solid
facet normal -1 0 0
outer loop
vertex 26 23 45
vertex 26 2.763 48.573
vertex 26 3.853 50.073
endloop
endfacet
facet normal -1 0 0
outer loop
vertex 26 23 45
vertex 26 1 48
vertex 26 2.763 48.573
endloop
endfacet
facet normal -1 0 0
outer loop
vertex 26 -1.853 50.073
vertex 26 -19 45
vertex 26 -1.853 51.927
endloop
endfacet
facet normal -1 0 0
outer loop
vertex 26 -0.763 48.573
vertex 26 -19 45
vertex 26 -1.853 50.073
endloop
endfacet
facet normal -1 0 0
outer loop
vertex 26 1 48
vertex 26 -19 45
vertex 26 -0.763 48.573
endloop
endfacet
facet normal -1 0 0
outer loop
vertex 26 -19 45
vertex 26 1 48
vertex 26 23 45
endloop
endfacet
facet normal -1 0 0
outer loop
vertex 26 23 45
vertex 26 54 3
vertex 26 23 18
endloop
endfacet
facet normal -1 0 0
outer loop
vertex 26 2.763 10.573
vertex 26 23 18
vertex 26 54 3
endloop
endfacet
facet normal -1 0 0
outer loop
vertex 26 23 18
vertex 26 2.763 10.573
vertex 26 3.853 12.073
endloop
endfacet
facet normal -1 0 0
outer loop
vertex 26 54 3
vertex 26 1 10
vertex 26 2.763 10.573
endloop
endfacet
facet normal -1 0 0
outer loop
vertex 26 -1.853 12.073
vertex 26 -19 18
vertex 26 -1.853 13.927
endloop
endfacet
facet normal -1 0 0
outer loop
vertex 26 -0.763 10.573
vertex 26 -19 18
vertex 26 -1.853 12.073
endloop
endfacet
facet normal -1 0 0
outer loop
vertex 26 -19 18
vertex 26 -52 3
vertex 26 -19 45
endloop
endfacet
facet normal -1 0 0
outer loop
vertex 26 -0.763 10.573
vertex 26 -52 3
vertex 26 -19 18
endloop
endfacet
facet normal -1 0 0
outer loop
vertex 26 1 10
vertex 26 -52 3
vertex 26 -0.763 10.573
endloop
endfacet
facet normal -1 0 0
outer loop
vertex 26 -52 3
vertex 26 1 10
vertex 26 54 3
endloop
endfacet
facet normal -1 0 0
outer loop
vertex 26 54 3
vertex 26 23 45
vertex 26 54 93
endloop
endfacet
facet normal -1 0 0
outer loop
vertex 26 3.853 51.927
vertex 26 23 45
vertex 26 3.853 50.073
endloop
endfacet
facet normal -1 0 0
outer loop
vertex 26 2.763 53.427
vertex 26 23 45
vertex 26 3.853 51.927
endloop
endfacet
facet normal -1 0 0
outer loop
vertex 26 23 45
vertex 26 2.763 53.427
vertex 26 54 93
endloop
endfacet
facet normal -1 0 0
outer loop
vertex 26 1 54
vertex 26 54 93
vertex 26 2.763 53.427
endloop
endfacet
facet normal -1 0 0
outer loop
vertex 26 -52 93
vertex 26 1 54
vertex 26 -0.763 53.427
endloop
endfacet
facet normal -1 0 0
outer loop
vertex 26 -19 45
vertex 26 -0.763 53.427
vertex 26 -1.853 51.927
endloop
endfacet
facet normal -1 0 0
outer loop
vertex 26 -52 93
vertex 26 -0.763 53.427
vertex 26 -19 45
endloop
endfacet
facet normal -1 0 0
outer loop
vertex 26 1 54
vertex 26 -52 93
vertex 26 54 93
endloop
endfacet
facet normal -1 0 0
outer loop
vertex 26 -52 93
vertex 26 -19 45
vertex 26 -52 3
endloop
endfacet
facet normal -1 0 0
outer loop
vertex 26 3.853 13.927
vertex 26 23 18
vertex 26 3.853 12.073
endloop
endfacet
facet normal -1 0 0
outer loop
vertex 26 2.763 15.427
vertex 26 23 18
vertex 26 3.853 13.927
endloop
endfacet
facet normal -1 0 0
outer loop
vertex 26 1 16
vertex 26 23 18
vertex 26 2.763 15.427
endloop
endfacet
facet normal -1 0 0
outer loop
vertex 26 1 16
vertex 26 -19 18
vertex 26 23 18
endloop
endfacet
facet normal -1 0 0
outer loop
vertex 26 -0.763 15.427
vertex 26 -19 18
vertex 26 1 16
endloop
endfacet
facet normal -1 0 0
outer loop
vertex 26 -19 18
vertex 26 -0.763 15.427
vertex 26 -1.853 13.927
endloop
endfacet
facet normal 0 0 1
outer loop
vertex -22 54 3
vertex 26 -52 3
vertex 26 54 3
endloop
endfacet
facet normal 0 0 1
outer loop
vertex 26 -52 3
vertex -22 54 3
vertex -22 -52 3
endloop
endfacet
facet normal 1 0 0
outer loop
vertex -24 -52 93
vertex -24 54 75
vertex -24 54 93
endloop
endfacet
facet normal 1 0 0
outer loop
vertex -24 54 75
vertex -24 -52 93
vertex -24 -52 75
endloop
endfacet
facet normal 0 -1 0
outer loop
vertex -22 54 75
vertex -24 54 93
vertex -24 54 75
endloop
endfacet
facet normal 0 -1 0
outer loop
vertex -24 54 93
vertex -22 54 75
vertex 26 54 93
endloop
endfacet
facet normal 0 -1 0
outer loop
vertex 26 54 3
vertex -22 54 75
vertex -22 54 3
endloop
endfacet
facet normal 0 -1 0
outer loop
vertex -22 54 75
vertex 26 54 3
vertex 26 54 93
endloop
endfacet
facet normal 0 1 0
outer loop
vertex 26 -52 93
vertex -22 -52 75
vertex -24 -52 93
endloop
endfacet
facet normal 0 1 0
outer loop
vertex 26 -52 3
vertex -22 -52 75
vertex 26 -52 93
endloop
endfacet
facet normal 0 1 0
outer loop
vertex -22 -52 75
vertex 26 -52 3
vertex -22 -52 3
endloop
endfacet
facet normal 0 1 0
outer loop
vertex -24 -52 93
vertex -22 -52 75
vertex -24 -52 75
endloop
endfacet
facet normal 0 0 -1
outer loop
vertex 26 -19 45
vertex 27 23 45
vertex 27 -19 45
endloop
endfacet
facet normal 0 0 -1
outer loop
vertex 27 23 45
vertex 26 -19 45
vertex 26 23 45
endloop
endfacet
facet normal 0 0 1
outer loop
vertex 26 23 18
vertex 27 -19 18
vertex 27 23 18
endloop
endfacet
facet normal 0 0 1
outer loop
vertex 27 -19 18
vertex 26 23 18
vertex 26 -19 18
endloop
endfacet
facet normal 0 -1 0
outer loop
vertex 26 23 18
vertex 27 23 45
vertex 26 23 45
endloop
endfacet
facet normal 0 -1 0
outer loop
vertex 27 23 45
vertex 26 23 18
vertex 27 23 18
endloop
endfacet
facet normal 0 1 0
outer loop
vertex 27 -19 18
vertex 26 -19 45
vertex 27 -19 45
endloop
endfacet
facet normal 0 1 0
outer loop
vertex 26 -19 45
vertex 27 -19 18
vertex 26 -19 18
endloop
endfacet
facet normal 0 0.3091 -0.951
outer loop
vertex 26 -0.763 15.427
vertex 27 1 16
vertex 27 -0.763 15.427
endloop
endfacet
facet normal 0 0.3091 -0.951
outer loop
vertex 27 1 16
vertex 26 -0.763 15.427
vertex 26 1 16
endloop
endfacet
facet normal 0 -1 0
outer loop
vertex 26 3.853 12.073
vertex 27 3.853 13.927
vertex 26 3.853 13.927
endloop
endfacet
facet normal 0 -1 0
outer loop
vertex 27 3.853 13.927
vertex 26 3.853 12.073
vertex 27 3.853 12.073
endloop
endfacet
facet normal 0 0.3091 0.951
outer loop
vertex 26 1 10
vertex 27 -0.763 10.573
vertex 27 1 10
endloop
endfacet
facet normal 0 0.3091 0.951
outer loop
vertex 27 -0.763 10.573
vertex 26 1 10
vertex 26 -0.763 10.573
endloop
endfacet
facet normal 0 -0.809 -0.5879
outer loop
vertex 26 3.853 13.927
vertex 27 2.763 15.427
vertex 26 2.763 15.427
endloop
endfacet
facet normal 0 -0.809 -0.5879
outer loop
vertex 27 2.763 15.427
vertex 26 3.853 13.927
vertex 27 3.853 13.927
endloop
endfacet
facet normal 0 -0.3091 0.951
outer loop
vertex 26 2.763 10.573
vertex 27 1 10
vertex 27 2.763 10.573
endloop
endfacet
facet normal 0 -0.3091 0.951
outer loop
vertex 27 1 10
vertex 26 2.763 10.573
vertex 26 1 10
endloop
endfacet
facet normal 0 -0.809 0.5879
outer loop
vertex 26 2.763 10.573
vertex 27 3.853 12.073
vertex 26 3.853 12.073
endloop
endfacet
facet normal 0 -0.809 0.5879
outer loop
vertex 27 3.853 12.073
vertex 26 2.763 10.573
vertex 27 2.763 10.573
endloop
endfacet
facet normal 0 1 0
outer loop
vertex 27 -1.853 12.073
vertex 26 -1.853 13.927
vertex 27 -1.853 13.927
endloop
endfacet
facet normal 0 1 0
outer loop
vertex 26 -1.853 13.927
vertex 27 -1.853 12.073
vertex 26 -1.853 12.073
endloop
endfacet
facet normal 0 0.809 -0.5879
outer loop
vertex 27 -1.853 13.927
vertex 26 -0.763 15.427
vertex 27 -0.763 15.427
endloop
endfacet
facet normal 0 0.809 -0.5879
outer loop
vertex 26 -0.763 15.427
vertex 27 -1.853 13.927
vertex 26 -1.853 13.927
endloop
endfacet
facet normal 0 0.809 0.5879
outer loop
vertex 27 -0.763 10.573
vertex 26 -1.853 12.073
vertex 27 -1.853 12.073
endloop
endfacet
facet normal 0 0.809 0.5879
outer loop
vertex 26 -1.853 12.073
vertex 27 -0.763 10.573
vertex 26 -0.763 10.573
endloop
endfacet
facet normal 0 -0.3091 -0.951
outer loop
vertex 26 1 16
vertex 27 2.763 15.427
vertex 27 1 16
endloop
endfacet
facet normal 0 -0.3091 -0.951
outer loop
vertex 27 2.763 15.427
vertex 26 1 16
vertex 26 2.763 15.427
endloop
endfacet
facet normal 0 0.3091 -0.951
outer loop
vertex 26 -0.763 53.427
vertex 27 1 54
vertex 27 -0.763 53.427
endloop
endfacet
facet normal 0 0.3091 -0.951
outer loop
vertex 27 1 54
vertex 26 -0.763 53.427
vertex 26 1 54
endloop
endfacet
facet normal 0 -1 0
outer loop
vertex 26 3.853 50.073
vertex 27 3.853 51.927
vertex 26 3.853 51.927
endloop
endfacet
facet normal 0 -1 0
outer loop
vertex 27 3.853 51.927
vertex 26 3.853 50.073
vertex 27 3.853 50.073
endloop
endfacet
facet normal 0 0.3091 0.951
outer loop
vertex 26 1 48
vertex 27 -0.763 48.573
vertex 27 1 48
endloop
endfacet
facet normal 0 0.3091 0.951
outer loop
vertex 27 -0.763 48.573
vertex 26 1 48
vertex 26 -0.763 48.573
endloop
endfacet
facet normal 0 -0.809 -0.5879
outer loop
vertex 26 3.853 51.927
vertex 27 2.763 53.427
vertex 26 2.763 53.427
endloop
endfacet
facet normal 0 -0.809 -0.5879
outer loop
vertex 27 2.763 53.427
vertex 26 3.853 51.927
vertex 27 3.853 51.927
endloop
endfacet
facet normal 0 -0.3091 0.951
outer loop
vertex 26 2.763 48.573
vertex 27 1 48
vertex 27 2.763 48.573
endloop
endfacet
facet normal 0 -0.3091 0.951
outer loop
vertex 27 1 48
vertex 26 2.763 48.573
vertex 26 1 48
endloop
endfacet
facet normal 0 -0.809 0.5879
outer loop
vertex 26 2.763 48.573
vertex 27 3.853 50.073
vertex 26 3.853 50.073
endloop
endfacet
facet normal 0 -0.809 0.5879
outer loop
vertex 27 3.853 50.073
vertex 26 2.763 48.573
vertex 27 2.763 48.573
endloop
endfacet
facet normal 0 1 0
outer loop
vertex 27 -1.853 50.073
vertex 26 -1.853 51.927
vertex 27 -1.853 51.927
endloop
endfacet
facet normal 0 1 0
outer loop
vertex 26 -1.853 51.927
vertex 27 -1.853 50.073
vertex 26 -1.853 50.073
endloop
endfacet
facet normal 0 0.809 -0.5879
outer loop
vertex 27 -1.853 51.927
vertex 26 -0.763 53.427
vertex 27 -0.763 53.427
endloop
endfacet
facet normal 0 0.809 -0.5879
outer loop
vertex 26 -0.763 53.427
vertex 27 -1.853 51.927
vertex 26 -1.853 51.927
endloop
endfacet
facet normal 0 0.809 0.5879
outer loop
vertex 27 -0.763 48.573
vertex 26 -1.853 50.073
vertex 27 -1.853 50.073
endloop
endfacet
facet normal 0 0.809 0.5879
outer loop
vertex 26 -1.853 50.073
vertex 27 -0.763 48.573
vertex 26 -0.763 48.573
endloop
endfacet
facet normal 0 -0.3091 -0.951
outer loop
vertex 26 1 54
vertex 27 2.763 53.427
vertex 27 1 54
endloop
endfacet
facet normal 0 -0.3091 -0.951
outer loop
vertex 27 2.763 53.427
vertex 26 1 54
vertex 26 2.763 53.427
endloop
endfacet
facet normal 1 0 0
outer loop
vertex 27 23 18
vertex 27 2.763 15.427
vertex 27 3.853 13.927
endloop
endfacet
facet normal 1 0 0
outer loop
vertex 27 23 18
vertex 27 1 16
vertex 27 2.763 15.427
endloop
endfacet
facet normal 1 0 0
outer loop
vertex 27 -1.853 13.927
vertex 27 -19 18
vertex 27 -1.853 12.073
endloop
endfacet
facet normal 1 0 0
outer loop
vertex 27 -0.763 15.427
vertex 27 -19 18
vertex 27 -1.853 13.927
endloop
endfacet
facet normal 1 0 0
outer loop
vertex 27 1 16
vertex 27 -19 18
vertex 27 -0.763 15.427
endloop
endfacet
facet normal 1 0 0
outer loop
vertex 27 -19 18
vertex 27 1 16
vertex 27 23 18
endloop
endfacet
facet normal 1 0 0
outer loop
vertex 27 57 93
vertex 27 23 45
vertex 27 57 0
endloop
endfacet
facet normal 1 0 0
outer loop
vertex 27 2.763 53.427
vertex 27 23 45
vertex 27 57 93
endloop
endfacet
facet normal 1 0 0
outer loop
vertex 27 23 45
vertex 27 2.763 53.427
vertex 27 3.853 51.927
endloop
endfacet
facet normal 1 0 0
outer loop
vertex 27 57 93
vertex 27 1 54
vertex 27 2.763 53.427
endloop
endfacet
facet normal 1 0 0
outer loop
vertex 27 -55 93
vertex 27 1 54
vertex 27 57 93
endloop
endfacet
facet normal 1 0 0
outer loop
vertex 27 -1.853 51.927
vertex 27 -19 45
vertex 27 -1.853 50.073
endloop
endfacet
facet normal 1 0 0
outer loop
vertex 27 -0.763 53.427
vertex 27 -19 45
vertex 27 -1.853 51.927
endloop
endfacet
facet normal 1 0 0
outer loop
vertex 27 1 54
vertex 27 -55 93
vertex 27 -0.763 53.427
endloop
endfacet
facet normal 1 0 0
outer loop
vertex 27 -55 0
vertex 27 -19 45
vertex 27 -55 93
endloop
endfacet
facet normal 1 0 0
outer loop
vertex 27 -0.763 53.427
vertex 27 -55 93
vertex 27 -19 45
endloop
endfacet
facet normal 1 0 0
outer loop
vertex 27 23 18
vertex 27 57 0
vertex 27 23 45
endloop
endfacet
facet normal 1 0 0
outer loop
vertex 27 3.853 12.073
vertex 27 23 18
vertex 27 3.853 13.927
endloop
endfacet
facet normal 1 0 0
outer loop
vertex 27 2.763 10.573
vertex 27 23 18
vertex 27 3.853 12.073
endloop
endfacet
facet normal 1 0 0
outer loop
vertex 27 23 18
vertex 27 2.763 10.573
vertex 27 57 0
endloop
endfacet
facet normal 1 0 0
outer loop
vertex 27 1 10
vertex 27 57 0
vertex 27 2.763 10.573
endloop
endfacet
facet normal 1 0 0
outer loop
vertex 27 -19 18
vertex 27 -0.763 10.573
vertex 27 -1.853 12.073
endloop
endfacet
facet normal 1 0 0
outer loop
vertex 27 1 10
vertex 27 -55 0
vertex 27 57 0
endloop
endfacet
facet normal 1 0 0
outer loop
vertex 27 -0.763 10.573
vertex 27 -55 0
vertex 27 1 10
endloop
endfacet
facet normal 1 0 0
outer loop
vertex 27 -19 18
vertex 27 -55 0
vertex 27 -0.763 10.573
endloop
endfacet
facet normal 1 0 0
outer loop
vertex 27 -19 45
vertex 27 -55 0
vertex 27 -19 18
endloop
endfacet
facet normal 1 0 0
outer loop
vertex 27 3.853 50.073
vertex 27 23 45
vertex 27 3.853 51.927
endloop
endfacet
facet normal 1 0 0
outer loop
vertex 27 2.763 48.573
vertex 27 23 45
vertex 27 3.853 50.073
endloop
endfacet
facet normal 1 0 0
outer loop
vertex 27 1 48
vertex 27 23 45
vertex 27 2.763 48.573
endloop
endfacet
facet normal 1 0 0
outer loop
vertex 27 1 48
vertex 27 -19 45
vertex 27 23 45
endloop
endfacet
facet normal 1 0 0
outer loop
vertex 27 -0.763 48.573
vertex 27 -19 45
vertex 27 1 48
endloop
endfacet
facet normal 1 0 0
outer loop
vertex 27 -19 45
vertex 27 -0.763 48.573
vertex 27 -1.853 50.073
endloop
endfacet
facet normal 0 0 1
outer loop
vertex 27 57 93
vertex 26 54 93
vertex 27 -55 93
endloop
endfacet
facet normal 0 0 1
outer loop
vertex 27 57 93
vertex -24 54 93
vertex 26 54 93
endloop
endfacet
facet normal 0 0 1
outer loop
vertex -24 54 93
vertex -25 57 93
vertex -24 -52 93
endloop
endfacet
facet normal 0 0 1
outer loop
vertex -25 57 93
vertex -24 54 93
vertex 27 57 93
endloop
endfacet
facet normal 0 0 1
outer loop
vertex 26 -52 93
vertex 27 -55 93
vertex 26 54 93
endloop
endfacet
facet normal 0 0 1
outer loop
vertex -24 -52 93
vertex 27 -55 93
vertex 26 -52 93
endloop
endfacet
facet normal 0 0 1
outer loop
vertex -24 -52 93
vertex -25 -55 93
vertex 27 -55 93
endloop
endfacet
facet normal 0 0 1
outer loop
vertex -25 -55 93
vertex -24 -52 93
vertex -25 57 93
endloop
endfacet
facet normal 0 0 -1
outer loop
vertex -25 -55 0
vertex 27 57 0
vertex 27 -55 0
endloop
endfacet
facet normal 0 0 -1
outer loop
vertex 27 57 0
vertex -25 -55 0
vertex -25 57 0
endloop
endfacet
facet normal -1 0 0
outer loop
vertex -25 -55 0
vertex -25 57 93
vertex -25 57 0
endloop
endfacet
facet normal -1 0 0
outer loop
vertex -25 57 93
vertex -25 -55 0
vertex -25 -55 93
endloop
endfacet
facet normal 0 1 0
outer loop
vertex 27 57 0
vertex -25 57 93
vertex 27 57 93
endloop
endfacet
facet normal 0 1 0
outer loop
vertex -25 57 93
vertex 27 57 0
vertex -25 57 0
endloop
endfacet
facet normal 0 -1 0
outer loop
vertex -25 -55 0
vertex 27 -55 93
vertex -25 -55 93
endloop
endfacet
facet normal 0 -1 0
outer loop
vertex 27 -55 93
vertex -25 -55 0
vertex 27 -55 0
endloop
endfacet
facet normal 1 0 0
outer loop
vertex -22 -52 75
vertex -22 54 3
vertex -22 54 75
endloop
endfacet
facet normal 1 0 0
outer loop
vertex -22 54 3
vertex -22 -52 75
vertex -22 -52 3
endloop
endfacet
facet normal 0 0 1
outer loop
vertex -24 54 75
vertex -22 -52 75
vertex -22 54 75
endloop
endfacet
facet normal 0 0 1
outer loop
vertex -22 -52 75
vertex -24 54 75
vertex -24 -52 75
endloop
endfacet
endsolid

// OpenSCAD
translate([-25,-55,0]) { 
  difference() {
    // cube outter
    cube([52,112,93]);
    // subtraction shape
    translate([1,1,3])
      union() {
        // FIXME: Damon check 7 length here, too short??
        // main inner body
        translate([0, 2, 0])  
          cube([50,106,98]);
        // switch cutout
        translate([0, 35, 15])
          cube([100,42,27]);
        // switch holes
        translate([40,55,10])
          rotate([0,90,0])
            cylinder(h=20, r1=3, r2=3);
        translate([40,55,48])
          rotate([0,90,0])
            cylinder(h=20, r1=3, r2=3);
        // frame holes
      }
  }
}


translate([-25,-55,0])
  cube([3,110,75]);
